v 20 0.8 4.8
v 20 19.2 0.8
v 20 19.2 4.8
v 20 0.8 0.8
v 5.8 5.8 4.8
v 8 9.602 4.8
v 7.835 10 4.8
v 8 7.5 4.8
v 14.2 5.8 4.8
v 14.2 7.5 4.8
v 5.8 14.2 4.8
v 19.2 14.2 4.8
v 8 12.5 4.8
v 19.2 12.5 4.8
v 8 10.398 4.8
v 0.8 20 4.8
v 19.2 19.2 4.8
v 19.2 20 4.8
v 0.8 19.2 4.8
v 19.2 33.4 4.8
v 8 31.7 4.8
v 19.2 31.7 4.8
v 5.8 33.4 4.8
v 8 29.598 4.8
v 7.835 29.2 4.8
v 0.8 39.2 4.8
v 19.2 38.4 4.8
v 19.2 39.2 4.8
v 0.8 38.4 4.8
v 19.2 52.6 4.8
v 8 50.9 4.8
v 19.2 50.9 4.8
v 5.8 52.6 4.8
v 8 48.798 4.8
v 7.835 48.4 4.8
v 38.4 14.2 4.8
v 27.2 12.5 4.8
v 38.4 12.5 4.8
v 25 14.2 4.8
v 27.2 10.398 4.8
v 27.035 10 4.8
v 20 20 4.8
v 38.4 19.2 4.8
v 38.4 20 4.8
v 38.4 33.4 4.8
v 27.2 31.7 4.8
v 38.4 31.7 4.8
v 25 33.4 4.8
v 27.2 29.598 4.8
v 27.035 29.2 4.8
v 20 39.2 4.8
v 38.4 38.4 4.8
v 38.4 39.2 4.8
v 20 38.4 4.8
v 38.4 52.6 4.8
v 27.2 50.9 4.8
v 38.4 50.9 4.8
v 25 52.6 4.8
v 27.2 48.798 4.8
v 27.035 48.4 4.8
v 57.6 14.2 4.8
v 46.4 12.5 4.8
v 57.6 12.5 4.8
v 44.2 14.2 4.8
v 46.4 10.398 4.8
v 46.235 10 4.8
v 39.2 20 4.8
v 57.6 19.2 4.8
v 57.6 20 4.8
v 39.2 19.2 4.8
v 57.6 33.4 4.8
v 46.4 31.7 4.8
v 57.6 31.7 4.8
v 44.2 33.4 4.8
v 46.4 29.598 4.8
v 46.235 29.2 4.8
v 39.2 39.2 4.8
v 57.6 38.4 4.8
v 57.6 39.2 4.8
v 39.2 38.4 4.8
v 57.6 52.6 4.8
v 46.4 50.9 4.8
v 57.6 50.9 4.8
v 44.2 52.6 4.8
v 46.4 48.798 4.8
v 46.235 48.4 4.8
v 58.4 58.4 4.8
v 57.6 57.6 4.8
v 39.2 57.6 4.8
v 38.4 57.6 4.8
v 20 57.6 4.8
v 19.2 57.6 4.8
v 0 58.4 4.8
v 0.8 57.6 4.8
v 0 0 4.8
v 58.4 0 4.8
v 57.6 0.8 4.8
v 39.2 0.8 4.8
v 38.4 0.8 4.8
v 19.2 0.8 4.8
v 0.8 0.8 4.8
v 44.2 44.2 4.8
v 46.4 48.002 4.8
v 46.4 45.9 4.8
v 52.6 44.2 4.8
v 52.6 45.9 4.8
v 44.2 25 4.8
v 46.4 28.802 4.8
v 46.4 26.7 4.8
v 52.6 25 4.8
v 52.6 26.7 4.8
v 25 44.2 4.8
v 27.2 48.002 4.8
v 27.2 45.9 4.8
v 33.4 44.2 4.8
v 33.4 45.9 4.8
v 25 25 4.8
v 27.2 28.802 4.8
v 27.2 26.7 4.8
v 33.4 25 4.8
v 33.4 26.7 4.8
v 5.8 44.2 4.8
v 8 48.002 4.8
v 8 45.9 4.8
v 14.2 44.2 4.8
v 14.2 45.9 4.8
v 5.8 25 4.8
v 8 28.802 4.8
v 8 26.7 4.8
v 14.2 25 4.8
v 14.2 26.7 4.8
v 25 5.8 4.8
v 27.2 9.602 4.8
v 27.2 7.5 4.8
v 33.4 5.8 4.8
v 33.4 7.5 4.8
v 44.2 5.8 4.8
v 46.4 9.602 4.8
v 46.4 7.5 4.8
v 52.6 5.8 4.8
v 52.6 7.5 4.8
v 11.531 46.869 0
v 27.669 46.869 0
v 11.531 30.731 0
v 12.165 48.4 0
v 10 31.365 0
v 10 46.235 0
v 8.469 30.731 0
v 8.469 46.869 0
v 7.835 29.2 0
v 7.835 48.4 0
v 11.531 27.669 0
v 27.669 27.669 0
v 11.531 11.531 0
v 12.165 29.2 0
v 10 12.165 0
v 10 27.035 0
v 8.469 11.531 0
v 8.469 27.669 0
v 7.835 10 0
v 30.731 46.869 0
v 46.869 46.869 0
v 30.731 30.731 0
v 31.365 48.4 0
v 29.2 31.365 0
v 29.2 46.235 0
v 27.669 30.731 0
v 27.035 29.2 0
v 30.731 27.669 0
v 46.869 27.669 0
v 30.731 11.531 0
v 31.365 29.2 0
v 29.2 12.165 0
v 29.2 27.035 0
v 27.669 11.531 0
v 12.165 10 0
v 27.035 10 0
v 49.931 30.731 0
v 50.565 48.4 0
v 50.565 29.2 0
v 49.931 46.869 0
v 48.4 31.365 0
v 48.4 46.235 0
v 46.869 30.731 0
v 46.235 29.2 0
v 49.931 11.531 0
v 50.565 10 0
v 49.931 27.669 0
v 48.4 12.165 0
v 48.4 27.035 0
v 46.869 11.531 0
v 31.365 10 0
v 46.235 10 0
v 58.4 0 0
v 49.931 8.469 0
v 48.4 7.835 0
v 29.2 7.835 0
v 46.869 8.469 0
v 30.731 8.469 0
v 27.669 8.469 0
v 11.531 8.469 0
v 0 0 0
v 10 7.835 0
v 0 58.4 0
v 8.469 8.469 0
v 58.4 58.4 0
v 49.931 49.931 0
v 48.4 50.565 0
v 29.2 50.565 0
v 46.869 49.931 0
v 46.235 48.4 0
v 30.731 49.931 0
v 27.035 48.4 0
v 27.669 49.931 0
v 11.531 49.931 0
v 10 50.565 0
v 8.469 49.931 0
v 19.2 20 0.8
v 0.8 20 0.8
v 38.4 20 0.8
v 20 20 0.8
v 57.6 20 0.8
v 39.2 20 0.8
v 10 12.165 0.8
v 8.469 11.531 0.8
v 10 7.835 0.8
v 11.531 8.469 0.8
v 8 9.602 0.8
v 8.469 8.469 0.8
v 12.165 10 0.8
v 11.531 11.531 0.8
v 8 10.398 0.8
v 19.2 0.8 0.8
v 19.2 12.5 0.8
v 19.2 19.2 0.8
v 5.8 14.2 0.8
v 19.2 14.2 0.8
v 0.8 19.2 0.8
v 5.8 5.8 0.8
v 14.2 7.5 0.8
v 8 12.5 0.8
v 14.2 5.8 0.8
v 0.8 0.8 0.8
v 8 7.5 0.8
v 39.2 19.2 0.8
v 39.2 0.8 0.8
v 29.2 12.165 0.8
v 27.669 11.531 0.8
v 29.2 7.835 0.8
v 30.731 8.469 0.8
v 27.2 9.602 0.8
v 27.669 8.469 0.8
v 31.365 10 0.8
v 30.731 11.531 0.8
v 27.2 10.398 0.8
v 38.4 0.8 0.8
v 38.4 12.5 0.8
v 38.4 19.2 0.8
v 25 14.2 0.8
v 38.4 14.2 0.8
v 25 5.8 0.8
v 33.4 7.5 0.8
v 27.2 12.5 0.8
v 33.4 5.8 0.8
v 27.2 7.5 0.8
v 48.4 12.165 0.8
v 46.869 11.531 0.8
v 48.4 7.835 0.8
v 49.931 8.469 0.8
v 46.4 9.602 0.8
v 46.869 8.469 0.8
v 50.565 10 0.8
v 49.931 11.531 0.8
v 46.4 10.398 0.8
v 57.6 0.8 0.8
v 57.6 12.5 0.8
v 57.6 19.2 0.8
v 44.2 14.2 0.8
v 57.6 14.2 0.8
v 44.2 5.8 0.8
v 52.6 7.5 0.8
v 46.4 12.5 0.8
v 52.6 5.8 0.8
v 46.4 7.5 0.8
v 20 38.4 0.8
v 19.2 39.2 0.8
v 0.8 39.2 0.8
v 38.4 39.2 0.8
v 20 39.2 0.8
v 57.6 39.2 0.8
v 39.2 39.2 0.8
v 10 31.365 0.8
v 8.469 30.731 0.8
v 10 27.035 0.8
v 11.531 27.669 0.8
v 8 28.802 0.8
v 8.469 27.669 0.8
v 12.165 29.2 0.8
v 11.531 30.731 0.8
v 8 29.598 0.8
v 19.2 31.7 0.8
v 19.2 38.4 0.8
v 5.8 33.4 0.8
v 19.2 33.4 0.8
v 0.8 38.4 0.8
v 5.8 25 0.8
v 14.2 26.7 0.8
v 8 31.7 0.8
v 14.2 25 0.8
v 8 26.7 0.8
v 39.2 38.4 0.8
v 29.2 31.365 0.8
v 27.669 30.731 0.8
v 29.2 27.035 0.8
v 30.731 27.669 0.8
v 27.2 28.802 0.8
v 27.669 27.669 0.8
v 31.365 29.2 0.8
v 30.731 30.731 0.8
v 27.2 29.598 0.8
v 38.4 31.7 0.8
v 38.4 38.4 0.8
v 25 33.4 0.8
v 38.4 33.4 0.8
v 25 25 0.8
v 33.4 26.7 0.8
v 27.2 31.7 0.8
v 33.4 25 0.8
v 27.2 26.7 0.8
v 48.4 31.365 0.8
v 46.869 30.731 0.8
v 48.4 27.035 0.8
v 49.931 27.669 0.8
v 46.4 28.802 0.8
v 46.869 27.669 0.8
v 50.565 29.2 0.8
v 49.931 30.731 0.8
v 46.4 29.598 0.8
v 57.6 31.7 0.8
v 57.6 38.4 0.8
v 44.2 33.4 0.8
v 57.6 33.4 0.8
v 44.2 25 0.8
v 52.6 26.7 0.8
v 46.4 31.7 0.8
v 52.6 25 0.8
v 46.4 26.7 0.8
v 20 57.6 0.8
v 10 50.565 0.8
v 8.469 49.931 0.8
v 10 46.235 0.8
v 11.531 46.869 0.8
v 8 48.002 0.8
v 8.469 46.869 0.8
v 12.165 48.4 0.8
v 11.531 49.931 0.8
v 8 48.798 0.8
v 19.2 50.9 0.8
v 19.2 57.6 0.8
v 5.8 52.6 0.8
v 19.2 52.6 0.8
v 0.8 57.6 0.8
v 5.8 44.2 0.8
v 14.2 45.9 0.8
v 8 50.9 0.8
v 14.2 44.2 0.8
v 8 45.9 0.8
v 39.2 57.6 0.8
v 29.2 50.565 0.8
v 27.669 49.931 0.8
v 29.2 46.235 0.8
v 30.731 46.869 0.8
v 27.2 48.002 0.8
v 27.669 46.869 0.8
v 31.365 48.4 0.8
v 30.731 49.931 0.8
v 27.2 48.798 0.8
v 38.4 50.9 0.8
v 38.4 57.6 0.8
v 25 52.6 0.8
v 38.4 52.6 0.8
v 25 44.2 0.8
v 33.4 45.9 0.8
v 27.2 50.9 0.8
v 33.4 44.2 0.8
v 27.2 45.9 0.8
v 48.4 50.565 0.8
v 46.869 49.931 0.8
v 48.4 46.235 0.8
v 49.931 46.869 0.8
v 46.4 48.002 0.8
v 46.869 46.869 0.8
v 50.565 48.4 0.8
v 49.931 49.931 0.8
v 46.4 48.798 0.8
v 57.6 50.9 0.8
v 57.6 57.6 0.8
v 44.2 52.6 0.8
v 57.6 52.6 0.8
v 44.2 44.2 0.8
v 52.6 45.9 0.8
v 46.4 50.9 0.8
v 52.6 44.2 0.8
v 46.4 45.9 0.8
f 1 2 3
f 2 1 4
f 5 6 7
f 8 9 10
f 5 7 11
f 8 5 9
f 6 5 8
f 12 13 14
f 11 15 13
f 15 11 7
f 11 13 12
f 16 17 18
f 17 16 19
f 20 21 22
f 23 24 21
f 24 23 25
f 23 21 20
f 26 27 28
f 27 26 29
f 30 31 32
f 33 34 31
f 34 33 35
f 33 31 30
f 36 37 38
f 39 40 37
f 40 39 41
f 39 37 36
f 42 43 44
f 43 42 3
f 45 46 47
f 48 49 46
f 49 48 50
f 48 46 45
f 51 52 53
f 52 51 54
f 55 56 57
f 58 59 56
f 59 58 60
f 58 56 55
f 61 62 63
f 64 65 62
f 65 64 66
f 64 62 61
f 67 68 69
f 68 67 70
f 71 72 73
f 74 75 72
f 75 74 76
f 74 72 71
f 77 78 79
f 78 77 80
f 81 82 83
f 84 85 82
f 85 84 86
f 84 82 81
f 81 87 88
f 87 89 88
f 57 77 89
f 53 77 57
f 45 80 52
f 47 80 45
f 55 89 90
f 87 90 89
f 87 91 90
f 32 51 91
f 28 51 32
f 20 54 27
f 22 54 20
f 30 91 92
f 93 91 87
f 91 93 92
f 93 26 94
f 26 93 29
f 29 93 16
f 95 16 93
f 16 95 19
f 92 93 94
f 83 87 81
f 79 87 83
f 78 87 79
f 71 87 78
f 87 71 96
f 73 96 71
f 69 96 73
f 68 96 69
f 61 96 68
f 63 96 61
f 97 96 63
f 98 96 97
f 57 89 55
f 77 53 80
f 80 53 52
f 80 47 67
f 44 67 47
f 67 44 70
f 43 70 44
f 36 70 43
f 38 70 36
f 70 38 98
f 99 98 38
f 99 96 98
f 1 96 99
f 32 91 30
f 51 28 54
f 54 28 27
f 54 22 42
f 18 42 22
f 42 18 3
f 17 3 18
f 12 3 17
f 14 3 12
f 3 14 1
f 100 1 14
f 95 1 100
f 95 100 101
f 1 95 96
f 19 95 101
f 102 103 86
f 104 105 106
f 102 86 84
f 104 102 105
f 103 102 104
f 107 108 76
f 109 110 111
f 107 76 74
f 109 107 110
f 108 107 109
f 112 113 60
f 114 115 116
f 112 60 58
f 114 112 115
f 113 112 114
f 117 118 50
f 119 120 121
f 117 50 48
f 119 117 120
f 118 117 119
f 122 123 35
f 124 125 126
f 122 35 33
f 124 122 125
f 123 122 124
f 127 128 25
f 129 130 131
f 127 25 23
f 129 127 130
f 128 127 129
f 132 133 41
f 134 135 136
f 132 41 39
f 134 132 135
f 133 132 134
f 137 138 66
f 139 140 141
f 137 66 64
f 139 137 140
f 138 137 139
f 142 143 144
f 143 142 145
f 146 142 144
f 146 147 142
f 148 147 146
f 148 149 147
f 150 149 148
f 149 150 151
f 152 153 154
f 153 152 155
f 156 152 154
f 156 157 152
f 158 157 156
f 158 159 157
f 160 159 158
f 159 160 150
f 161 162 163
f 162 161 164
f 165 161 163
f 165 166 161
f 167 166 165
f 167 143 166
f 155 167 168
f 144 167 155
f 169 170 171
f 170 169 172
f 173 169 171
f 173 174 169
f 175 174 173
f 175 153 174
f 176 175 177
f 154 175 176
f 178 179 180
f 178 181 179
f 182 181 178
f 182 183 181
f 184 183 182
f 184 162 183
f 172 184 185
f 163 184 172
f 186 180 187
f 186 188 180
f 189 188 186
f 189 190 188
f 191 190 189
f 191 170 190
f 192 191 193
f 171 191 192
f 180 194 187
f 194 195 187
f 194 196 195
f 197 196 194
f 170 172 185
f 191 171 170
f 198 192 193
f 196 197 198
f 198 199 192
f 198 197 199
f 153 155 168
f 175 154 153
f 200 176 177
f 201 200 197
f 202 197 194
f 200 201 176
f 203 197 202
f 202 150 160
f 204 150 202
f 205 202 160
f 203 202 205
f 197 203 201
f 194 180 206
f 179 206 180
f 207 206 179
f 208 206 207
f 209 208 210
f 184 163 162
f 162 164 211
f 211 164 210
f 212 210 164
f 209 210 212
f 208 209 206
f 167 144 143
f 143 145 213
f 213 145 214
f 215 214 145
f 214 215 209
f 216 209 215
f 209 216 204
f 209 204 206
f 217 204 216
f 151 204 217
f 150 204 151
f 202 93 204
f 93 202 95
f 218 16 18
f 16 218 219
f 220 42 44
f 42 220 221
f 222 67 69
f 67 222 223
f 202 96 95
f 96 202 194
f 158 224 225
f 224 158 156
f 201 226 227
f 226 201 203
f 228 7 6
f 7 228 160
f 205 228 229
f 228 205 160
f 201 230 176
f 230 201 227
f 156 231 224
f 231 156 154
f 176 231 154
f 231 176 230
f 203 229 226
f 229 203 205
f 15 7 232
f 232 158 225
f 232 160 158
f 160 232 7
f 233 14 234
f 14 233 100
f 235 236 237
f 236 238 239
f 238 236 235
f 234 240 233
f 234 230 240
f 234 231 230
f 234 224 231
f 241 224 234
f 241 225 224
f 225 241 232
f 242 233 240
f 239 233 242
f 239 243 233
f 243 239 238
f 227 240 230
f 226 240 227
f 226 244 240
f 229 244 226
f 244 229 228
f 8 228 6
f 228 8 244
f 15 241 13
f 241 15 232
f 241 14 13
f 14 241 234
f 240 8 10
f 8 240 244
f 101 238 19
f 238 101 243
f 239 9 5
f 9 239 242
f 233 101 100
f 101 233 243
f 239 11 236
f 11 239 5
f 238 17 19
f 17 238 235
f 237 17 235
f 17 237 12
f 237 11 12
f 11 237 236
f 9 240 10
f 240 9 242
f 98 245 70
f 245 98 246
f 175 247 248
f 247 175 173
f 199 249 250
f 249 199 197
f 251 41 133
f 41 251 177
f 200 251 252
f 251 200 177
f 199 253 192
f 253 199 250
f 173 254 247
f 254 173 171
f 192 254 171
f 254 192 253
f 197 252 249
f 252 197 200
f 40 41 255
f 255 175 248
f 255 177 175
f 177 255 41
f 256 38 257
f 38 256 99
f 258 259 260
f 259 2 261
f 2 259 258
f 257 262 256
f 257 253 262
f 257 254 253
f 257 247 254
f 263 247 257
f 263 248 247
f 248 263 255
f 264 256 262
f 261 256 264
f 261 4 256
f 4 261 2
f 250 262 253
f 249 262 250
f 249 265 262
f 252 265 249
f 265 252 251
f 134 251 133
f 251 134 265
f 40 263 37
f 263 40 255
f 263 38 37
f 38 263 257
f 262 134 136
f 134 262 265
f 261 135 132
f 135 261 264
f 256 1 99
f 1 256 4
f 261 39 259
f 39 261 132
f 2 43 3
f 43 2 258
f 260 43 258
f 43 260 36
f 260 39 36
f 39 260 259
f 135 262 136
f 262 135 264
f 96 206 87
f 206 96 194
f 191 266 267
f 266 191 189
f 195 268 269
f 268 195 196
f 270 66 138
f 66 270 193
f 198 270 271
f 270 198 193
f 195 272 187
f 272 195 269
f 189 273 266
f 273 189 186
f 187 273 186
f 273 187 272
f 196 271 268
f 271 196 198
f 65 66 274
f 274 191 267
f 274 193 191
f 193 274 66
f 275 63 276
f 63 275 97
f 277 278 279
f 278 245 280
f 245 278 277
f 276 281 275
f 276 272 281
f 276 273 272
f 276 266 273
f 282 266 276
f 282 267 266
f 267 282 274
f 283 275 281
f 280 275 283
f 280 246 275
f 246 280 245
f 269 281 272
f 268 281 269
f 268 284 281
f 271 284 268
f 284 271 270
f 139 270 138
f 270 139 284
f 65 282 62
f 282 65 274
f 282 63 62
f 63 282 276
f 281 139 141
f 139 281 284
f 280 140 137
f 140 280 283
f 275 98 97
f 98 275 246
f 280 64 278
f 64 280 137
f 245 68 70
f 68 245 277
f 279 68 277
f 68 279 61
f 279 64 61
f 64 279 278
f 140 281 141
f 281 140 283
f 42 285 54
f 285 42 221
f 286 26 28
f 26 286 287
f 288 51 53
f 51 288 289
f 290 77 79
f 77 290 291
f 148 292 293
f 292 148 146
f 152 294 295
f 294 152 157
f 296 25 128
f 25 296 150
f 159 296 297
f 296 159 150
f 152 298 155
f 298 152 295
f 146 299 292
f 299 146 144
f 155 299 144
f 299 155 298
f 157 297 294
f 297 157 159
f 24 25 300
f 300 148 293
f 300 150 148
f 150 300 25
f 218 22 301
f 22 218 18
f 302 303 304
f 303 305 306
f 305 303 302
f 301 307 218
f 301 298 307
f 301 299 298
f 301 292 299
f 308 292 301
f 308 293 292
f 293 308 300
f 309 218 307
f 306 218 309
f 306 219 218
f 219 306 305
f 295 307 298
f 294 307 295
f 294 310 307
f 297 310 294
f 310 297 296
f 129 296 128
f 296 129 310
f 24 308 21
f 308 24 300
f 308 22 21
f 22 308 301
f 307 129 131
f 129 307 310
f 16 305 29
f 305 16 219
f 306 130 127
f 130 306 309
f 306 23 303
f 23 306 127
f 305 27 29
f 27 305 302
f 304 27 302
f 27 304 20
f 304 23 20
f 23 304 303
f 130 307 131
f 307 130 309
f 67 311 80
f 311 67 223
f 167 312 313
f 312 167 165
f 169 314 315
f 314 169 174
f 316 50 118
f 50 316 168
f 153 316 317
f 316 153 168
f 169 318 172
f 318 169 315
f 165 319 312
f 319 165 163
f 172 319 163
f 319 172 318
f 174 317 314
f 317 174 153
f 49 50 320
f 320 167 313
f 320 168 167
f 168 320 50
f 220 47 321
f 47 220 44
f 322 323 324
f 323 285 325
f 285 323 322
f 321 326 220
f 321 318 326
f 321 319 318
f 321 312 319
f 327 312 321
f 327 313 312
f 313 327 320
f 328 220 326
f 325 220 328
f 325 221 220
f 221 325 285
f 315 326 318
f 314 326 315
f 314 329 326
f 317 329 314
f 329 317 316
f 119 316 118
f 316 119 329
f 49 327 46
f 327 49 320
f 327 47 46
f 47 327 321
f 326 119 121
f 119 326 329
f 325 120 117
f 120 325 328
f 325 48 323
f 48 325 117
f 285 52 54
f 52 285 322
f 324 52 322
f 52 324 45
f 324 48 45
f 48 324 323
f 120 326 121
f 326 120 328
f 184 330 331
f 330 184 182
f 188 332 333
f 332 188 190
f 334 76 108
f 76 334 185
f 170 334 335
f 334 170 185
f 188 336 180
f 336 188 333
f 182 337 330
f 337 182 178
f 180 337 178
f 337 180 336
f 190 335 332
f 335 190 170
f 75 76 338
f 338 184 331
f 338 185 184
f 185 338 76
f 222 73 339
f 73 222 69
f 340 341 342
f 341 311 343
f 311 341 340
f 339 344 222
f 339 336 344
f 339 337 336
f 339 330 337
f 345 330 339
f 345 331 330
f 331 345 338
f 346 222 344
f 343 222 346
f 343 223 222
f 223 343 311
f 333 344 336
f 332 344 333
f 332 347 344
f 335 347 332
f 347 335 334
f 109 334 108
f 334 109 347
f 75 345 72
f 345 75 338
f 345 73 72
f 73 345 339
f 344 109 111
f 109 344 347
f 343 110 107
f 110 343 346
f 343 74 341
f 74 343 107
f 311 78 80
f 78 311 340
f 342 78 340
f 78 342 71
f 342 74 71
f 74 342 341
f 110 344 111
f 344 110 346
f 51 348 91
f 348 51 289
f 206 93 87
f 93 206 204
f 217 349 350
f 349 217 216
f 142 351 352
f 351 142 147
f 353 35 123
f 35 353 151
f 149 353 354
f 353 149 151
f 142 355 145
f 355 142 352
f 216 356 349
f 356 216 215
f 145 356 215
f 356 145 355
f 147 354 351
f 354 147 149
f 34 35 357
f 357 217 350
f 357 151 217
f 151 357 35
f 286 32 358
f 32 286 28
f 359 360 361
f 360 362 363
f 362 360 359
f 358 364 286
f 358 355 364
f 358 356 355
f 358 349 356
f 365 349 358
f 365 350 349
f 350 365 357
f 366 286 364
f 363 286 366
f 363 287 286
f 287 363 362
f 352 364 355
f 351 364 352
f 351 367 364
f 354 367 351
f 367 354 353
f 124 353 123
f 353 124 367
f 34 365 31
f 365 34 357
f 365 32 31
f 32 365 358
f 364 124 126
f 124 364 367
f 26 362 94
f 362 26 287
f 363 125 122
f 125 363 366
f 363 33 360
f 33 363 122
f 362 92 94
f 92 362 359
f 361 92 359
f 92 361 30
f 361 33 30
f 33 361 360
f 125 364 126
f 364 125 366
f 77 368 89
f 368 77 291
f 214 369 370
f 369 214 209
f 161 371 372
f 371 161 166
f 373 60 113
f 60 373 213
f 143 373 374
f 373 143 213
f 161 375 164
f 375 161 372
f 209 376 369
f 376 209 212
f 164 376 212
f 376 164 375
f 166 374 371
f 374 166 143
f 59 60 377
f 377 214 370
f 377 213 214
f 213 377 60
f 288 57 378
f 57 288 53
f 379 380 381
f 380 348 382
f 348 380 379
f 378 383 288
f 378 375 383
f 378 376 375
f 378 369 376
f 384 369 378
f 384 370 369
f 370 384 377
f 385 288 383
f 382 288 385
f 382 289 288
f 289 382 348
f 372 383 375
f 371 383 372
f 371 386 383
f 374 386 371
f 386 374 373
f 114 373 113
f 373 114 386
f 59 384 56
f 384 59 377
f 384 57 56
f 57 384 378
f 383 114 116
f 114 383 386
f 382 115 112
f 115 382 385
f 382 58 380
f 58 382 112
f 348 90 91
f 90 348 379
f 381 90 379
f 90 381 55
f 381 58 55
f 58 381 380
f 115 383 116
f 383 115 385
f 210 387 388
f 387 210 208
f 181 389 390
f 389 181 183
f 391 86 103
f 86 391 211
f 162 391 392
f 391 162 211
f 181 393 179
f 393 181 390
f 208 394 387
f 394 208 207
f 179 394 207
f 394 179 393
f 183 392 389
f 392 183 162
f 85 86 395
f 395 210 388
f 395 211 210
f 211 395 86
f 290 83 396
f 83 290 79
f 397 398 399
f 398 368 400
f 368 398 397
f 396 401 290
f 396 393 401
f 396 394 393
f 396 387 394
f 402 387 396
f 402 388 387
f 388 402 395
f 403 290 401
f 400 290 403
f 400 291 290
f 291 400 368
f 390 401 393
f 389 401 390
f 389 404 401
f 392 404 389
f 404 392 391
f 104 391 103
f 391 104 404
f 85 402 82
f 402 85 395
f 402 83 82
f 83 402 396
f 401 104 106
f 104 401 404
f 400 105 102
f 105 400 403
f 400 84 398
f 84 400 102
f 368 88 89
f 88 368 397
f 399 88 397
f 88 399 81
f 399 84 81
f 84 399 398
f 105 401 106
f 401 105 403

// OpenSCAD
// Copyright 2017 joehil
// This file is licensed under the terms of Creative Commons Attribution 3.0 Unported.

holed=4;
otubed=20;
wallh=4;
tubesx=3;
tubesy=3;

// module polyhole is Copyright 2011 Nophead (of RepRap fame)
// This file is licensed under the terms of Creative Commons Attribution 3.0 Unported.
module polyhole(h, d) {
    n = max(round(2 * d),3);
    rotate([0,0,180])
        cylinder(h = h, r = (d / 2) / cos (180 / n), $fn = n);
}

module coil(){
    difference(){
        cube(size=[otubed,otubed,wallh+0.8]);
        translate([otubed/2,otubed/2,-1])
        polyhole(h = 7, d = holed);
        translate([otubed/2-holed/2,otubed/2-2.5,0.8])
        cube(size=[otubed/2-0.8+2,5,7]);
        translate([0.8,0.8,0.8])
        cube(size=[otubed-1.6,5,7]);
        translate([0.8,0.8,0.8])
        cube(size=[5,otubed-1.6,7]);
        translate([0.8,otubed-5-0.8,0.8])
        cube(size=[otubed-1.6,5,7]);
        translate([otubed-5-0.8,0.8,0.8])
        cube(size=[5,otubed/2,7]);
        
    }
}

union(){
for(k=[0:tubesy-1]){  
  for(i=[0:tubesx-1]){
    translate([otubed*i-i*0.8,otubed*k-k*0.8,0])  
    coil();
  } 
}
}
